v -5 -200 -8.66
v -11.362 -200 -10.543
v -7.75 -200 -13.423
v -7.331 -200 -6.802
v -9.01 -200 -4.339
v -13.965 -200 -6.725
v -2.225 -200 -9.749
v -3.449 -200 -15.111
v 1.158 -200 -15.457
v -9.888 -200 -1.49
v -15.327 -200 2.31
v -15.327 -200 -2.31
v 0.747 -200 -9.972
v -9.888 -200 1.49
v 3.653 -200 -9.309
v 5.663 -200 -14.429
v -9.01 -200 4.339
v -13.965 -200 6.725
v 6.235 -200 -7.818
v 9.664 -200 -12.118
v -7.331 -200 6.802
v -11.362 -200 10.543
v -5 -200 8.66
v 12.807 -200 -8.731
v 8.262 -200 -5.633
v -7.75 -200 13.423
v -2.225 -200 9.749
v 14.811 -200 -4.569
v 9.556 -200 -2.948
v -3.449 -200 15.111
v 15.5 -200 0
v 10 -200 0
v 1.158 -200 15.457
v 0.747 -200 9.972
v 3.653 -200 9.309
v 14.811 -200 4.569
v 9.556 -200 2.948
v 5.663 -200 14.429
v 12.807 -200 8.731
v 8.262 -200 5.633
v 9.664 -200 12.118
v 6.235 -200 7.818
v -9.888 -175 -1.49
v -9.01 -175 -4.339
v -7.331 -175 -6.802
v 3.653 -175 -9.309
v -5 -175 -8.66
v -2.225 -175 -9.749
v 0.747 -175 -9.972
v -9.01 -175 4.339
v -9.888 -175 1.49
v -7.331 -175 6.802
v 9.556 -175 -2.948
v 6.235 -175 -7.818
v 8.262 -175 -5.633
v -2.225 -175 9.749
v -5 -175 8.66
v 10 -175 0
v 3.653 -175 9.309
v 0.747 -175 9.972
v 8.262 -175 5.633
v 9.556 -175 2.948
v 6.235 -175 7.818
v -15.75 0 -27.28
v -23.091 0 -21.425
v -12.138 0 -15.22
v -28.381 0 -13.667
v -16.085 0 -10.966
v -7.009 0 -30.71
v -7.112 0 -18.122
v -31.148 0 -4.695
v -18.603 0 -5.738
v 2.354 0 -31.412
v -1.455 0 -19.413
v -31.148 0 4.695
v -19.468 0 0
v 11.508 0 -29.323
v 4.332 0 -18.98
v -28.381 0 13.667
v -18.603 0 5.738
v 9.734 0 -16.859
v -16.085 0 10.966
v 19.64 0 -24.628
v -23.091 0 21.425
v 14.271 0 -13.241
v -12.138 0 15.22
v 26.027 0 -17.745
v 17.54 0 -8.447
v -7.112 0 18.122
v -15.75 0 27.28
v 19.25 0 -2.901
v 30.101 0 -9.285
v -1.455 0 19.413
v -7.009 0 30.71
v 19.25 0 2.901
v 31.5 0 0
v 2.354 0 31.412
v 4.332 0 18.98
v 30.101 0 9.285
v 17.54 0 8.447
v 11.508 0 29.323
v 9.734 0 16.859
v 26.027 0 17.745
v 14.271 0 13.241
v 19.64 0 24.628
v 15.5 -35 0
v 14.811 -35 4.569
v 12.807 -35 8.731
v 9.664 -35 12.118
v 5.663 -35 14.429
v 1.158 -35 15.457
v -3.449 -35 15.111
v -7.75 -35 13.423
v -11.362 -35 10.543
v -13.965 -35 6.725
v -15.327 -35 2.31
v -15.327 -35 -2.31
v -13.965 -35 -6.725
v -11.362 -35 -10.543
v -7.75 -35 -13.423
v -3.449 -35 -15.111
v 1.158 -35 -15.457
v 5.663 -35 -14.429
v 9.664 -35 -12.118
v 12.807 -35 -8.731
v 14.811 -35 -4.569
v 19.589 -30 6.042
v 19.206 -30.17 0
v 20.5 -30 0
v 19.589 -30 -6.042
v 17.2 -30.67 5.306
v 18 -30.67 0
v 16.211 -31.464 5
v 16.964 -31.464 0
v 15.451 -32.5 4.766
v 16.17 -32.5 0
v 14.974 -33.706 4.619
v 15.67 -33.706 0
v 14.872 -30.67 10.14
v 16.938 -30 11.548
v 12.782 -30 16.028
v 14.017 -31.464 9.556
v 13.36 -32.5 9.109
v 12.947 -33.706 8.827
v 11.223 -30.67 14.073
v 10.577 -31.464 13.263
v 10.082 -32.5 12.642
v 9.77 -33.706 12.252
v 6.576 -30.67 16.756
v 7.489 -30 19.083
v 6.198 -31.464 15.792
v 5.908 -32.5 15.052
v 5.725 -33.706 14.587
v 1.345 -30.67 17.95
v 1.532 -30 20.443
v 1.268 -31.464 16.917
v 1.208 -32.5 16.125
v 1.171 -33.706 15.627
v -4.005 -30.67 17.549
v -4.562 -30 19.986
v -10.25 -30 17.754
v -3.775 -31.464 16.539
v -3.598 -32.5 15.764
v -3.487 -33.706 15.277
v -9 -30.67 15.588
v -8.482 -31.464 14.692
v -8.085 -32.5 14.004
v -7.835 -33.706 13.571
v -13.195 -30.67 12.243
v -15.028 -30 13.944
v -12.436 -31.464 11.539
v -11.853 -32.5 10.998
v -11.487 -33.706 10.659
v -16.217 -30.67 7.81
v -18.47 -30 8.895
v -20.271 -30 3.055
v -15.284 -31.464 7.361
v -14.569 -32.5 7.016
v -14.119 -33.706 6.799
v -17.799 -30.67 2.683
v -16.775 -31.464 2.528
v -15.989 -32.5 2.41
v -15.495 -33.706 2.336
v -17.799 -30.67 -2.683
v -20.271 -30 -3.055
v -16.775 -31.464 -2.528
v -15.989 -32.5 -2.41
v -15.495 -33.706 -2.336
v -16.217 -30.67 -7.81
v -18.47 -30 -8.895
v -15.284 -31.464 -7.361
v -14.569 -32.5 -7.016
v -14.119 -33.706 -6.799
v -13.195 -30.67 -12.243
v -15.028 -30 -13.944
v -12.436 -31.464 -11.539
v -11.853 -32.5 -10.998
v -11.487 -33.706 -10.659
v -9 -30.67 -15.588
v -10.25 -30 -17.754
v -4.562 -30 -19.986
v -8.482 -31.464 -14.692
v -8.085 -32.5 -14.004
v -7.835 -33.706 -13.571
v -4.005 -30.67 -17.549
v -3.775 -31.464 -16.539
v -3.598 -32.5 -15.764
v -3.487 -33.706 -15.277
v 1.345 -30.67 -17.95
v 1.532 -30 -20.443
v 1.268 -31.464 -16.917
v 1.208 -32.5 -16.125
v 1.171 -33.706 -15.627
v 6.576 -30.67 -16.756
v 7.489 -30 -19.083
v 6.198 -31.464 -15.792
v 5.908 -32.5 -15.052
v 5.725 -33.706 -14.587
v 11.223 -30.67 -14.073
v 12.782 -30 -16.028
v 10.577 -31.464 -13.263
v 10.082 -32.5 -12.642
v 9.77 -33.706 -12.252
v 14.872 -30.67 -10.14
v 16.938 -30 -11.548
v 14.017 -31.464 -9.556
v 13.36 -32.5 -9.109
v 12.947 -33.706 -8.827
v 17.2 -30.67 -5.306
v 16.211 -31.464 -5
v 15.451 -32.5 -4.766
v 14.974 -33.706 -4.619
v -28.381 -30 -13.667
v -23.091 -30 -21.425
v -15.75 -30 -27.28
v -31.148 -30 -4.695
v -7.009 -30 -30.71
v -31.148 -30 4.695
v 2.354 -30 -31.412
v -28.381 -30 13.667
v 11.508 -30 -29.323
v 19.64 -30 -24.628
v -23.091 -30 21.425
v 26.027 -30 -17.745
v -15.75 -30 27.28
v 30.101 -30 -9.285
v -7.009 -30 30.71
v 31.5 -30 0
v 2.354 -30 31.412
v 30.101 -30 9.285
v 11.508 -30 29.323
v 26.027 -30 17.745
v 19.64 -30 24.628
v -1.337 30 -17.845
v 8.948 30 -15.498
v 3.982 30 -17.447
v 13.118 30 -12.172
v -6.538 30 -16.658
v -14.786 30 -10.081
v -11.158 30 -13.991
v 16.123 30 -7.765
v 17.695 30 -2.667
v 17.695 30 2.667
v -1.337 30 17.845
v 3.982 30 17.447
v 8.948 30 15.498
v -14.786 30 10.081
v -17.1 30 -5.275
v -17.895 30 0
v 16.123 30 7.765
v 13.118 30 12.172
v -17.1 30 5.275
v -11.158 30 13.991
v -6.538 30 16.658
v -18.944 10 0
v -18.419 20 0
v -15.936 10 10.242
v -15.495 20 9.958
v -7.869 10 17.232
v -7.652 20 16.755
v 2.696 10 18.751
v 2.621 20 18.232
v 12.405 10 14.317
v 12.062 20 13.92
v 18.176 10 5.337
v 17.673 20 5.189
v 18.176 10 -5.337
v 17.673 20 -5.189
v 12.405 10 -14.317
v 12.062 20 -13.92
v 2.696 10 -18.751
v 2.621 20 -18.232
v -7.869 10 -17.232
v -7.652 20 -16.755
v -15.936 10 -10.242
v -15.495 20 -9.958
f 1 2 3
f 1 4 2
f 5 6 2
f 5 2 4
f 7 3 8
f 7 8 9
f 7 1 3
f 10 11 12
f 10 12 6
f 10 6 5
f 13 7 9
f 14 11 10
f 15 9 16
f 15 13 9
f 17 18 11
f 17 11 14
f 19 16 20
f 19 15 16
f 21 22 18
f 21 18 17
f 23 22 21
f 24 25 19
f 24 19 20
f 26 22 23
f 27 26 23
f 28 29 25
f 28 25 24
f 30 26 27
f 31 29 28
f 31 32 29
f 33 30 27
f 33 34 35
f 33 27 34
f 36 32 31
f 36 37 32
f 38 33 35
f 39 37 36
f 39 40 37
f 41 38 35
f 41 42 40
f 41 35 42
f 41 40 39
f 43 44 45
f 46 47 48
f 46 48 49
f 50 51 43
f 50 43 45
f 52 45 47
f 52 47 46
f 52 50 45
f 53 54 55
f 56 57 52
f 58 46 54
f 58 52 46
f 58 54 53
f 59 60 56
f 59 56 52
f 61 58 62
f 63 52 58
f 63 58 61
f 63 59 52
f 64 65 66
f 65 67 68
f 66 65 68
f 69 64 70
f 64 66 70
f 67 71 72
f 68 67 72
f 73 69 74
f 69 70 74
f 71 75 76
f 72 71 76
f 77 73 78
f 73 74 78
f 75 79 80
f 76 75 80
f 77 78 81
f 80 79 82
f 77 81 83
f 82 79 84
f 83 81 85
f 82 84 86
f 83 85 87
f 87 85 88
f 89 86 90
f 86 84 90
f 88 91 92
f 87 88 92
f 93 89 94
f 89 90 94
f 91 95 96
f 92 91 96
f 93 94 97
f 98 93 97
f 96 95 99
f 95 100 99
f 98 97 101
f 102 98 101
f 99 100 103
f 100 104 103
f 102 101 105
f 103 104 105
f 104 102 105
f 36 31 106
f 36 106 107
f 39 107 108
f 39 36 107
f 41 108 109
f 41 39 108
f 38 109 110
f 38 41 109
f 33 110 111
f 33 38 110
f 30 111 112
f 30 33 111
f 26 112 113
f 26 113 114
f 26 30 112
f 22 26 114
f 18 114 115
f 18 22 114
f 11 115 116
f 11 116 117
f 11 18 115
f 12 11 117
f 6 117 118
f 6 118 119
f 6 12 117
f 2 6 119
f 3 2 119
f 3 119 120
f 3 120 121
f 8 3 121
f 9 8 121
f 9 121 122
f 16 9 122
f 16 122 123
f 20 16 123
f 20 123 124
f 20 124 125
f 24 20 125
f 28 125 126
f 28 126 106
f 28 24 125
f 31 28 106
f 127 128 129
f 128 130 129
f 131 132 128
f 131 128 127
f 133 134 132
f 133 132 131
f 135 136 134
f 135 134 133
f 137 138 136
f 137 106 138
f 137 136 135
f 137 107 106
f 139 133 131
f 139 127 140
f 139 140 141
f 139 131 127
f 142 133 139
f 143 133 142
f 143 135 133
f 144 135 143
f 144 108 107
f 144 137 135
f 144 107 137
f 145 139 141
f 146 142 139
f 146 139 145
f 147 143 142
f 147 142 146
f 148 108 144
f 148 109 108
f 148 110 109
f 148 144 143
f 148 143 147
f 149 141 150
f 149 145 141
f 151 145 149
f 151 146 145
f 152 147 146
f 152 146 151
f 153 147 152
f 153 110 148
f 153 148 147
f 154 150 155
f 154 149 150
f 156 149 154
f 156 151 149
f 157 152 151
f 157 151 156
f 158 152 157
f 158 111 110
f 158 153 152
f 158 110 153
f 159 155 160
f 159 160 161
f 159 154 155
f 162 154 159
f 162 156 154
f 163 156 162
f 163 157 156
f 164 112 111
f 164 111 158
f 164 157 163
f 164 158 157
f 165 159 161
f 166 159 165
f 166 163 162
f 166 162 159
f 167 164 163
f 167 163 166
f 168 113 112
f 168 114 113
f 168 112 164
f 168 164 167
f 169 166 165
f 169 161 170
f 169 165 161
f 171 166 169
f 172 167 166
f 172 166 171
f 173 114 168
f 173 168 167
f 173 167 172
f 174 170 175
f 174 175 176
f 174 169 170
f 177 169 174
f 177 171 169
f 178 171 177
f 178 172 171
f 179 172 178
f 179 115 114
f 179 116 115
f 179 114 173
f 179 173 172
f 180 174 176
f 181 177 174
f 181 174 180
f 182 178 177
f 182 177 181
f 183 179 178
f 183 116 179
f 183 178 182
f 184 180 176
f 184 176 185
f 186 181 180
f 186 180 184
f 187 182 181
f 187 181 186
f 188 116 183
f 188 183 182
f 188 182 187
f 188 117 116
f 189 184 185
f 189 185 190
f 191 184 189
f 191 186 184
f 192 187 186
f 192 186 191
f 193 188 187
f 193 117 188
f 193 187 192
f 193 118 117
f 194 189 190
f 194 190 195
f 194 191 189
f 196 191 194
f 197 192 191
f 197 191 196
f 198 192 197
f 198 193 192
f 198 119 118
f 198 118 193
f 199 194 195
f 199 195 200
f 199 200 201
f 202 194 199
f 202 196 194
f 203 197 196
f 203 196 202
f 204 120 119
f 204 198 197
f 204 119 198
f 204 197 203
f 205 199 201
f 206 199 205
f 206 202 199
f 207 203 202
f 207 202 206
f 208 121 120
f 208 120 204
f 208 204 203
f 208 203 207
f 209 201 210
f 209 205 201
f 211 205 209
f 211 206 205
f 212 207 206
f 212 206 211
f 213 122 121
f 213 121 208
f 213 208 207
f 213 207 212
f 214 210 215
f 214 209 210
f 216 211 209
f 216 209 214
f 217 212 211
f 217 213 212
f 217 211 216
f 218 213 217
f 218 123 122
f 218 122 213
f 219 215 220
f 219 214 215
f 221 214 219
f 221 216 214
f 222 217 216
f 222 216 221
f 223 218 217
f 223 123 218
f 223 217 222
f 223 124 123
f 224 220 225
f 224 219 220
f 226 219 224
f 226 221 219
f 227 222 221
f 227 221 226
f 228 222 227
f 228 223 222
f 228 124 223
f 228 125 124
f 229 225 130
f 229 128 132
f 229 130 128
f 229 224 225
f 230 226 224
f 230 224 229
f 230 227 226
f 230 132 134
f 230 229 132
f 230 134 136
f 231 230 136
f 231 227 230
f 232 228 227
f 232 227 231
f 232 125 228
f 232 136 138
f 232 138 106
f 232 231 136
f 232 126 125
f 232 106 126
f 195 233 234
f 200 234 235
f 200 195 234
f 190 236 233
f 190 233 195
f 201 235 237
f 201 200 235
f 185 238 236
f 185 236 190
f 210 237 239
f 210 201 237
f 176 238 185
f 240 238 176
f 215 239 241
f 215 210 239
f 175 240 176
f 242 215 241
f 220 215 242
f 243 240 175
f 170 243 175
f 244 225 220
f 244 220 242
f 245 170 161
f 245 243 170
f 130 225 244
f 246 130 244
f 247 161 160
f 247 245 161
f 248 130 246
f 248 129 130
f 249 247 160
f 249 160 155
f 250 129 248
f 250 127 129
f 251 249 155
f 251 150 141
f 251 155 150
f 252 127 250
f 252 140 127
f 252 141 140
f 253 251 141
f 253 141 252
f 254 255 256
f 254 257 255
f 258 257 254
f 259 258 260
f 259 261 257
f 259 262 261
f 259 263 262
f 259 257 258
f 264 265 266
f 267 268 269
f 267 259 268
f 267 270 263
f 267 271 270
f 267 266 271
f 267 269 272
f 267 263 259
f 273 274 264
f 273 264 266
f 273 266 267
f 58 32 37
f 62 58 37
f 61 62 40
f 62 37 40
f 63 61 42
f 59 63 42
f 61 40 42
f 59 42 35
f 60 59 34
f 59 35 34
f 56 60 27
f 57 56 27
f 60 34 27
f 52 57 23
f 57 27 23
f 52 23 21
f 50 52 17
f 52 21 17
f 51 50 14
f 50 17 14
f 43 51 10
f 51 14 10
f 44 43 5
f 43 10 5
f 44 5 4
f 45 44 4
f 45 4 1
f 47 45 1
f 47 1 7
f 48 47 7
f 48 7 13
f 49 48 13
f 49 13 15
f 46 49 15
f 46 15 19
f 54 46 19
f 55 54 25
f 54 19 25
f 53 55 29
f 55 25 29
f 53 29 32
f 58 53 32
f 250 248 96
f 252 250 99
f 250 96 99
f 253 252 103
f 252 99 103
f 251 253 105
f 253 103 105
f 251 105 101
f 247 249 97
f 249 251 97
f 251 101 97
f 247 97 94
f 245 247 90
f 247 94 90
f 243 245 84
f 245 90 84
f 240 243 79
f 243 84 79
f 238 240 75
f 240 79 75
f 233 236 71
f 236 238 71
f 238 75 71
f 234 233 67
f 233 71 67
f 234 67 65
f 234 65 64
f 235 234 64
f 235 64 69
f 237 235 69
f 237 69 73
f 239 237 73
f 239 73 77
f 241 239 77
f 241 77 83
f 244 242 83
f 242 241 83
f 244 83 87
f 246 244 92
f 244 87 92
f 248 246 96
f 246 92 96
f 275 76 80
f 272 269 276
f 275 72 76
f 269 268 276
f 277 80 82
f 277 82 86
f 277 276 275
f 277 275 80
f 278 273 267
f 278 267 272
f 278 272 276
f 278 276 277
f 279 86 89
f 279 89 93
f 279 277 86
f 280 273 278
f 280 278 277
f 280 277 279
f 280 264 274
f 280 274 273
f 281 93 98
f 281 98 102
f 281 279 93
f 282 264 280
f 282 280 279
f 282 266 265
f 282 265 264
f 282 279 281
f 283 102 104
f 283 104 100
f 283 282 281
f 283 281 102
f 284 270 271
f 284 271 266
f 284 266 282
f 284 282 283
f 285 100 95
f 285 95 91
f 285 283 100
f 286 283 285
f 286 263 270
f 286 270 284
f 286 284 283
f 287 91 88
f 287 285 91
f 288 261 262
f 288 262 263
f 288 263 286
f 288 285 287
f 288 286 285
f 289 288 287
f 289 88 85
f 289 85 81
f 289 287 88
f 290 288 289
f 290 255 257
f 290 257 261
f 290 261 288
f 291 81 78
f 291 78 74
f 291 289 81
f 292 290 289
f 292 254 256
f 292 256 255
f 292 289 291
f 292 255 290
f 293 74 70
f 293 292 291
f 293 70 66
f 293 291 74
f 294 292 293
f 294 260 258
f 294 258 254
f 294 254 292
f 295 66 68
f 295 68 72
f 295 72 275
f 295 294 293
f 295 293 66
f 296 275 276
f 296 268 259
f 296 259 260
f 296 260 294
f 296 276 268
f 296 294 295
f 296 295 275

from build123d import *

# Parameters (mm, degrees)
F0_R     = 31.5
F1_DEPTH = 200
F2_R     = 49.4625151614
F2_R_2   = 15.5
F3_DEPTH = 170
F4_R     = 5
F5_R     = 19.4675976679
F6_DEPTH = 30
F6_TAPER = 3
F7_R     = 10
F8_DEPTH = 25


with BuildPart() as f1:
    # F0 (on Front) → F1 (new body)
    with BuildSketch(Plane.XZ):
        Circle(F0_R)
    extrude(amount=F1_DEPTH)

    # F2 (on face) → F3 (cut)
    with BuildSketch(Plane.XZ.offset(200)):
        Circle(F2_R)
        Circle(F2_R_2, mode=Mode.SUBTRACT)
    extrude(amount=-F3_DEPTH, mode=Mode.SUBTRACT)

    # F4
    f4_edges = [f1.edges().sort_by_distance(p)[0] for p in [
        (-15.5, -30, 0),
    ]]
    fillet(f4_edges, radius=F4_R)

    # F5 (on face) → F6 (join)
    with BuildSketch(Plane(origin=(0, 0, 0), x_dir=(-1, 0, 0), z_dir=(0, 1, 0))):
        Circle(F5_R)
    extrude(amount=F6_DEPTH, taper=F6_TAPER)

    # F7 (on face) → F8 (cut)
    with BuildSketch(Plane.XZ.offset(200)):
        Circle(F7_R)
    extrude(amount=-F8_DEPTH, mode=Mode.SUBTRACT)


solid = f1.part
